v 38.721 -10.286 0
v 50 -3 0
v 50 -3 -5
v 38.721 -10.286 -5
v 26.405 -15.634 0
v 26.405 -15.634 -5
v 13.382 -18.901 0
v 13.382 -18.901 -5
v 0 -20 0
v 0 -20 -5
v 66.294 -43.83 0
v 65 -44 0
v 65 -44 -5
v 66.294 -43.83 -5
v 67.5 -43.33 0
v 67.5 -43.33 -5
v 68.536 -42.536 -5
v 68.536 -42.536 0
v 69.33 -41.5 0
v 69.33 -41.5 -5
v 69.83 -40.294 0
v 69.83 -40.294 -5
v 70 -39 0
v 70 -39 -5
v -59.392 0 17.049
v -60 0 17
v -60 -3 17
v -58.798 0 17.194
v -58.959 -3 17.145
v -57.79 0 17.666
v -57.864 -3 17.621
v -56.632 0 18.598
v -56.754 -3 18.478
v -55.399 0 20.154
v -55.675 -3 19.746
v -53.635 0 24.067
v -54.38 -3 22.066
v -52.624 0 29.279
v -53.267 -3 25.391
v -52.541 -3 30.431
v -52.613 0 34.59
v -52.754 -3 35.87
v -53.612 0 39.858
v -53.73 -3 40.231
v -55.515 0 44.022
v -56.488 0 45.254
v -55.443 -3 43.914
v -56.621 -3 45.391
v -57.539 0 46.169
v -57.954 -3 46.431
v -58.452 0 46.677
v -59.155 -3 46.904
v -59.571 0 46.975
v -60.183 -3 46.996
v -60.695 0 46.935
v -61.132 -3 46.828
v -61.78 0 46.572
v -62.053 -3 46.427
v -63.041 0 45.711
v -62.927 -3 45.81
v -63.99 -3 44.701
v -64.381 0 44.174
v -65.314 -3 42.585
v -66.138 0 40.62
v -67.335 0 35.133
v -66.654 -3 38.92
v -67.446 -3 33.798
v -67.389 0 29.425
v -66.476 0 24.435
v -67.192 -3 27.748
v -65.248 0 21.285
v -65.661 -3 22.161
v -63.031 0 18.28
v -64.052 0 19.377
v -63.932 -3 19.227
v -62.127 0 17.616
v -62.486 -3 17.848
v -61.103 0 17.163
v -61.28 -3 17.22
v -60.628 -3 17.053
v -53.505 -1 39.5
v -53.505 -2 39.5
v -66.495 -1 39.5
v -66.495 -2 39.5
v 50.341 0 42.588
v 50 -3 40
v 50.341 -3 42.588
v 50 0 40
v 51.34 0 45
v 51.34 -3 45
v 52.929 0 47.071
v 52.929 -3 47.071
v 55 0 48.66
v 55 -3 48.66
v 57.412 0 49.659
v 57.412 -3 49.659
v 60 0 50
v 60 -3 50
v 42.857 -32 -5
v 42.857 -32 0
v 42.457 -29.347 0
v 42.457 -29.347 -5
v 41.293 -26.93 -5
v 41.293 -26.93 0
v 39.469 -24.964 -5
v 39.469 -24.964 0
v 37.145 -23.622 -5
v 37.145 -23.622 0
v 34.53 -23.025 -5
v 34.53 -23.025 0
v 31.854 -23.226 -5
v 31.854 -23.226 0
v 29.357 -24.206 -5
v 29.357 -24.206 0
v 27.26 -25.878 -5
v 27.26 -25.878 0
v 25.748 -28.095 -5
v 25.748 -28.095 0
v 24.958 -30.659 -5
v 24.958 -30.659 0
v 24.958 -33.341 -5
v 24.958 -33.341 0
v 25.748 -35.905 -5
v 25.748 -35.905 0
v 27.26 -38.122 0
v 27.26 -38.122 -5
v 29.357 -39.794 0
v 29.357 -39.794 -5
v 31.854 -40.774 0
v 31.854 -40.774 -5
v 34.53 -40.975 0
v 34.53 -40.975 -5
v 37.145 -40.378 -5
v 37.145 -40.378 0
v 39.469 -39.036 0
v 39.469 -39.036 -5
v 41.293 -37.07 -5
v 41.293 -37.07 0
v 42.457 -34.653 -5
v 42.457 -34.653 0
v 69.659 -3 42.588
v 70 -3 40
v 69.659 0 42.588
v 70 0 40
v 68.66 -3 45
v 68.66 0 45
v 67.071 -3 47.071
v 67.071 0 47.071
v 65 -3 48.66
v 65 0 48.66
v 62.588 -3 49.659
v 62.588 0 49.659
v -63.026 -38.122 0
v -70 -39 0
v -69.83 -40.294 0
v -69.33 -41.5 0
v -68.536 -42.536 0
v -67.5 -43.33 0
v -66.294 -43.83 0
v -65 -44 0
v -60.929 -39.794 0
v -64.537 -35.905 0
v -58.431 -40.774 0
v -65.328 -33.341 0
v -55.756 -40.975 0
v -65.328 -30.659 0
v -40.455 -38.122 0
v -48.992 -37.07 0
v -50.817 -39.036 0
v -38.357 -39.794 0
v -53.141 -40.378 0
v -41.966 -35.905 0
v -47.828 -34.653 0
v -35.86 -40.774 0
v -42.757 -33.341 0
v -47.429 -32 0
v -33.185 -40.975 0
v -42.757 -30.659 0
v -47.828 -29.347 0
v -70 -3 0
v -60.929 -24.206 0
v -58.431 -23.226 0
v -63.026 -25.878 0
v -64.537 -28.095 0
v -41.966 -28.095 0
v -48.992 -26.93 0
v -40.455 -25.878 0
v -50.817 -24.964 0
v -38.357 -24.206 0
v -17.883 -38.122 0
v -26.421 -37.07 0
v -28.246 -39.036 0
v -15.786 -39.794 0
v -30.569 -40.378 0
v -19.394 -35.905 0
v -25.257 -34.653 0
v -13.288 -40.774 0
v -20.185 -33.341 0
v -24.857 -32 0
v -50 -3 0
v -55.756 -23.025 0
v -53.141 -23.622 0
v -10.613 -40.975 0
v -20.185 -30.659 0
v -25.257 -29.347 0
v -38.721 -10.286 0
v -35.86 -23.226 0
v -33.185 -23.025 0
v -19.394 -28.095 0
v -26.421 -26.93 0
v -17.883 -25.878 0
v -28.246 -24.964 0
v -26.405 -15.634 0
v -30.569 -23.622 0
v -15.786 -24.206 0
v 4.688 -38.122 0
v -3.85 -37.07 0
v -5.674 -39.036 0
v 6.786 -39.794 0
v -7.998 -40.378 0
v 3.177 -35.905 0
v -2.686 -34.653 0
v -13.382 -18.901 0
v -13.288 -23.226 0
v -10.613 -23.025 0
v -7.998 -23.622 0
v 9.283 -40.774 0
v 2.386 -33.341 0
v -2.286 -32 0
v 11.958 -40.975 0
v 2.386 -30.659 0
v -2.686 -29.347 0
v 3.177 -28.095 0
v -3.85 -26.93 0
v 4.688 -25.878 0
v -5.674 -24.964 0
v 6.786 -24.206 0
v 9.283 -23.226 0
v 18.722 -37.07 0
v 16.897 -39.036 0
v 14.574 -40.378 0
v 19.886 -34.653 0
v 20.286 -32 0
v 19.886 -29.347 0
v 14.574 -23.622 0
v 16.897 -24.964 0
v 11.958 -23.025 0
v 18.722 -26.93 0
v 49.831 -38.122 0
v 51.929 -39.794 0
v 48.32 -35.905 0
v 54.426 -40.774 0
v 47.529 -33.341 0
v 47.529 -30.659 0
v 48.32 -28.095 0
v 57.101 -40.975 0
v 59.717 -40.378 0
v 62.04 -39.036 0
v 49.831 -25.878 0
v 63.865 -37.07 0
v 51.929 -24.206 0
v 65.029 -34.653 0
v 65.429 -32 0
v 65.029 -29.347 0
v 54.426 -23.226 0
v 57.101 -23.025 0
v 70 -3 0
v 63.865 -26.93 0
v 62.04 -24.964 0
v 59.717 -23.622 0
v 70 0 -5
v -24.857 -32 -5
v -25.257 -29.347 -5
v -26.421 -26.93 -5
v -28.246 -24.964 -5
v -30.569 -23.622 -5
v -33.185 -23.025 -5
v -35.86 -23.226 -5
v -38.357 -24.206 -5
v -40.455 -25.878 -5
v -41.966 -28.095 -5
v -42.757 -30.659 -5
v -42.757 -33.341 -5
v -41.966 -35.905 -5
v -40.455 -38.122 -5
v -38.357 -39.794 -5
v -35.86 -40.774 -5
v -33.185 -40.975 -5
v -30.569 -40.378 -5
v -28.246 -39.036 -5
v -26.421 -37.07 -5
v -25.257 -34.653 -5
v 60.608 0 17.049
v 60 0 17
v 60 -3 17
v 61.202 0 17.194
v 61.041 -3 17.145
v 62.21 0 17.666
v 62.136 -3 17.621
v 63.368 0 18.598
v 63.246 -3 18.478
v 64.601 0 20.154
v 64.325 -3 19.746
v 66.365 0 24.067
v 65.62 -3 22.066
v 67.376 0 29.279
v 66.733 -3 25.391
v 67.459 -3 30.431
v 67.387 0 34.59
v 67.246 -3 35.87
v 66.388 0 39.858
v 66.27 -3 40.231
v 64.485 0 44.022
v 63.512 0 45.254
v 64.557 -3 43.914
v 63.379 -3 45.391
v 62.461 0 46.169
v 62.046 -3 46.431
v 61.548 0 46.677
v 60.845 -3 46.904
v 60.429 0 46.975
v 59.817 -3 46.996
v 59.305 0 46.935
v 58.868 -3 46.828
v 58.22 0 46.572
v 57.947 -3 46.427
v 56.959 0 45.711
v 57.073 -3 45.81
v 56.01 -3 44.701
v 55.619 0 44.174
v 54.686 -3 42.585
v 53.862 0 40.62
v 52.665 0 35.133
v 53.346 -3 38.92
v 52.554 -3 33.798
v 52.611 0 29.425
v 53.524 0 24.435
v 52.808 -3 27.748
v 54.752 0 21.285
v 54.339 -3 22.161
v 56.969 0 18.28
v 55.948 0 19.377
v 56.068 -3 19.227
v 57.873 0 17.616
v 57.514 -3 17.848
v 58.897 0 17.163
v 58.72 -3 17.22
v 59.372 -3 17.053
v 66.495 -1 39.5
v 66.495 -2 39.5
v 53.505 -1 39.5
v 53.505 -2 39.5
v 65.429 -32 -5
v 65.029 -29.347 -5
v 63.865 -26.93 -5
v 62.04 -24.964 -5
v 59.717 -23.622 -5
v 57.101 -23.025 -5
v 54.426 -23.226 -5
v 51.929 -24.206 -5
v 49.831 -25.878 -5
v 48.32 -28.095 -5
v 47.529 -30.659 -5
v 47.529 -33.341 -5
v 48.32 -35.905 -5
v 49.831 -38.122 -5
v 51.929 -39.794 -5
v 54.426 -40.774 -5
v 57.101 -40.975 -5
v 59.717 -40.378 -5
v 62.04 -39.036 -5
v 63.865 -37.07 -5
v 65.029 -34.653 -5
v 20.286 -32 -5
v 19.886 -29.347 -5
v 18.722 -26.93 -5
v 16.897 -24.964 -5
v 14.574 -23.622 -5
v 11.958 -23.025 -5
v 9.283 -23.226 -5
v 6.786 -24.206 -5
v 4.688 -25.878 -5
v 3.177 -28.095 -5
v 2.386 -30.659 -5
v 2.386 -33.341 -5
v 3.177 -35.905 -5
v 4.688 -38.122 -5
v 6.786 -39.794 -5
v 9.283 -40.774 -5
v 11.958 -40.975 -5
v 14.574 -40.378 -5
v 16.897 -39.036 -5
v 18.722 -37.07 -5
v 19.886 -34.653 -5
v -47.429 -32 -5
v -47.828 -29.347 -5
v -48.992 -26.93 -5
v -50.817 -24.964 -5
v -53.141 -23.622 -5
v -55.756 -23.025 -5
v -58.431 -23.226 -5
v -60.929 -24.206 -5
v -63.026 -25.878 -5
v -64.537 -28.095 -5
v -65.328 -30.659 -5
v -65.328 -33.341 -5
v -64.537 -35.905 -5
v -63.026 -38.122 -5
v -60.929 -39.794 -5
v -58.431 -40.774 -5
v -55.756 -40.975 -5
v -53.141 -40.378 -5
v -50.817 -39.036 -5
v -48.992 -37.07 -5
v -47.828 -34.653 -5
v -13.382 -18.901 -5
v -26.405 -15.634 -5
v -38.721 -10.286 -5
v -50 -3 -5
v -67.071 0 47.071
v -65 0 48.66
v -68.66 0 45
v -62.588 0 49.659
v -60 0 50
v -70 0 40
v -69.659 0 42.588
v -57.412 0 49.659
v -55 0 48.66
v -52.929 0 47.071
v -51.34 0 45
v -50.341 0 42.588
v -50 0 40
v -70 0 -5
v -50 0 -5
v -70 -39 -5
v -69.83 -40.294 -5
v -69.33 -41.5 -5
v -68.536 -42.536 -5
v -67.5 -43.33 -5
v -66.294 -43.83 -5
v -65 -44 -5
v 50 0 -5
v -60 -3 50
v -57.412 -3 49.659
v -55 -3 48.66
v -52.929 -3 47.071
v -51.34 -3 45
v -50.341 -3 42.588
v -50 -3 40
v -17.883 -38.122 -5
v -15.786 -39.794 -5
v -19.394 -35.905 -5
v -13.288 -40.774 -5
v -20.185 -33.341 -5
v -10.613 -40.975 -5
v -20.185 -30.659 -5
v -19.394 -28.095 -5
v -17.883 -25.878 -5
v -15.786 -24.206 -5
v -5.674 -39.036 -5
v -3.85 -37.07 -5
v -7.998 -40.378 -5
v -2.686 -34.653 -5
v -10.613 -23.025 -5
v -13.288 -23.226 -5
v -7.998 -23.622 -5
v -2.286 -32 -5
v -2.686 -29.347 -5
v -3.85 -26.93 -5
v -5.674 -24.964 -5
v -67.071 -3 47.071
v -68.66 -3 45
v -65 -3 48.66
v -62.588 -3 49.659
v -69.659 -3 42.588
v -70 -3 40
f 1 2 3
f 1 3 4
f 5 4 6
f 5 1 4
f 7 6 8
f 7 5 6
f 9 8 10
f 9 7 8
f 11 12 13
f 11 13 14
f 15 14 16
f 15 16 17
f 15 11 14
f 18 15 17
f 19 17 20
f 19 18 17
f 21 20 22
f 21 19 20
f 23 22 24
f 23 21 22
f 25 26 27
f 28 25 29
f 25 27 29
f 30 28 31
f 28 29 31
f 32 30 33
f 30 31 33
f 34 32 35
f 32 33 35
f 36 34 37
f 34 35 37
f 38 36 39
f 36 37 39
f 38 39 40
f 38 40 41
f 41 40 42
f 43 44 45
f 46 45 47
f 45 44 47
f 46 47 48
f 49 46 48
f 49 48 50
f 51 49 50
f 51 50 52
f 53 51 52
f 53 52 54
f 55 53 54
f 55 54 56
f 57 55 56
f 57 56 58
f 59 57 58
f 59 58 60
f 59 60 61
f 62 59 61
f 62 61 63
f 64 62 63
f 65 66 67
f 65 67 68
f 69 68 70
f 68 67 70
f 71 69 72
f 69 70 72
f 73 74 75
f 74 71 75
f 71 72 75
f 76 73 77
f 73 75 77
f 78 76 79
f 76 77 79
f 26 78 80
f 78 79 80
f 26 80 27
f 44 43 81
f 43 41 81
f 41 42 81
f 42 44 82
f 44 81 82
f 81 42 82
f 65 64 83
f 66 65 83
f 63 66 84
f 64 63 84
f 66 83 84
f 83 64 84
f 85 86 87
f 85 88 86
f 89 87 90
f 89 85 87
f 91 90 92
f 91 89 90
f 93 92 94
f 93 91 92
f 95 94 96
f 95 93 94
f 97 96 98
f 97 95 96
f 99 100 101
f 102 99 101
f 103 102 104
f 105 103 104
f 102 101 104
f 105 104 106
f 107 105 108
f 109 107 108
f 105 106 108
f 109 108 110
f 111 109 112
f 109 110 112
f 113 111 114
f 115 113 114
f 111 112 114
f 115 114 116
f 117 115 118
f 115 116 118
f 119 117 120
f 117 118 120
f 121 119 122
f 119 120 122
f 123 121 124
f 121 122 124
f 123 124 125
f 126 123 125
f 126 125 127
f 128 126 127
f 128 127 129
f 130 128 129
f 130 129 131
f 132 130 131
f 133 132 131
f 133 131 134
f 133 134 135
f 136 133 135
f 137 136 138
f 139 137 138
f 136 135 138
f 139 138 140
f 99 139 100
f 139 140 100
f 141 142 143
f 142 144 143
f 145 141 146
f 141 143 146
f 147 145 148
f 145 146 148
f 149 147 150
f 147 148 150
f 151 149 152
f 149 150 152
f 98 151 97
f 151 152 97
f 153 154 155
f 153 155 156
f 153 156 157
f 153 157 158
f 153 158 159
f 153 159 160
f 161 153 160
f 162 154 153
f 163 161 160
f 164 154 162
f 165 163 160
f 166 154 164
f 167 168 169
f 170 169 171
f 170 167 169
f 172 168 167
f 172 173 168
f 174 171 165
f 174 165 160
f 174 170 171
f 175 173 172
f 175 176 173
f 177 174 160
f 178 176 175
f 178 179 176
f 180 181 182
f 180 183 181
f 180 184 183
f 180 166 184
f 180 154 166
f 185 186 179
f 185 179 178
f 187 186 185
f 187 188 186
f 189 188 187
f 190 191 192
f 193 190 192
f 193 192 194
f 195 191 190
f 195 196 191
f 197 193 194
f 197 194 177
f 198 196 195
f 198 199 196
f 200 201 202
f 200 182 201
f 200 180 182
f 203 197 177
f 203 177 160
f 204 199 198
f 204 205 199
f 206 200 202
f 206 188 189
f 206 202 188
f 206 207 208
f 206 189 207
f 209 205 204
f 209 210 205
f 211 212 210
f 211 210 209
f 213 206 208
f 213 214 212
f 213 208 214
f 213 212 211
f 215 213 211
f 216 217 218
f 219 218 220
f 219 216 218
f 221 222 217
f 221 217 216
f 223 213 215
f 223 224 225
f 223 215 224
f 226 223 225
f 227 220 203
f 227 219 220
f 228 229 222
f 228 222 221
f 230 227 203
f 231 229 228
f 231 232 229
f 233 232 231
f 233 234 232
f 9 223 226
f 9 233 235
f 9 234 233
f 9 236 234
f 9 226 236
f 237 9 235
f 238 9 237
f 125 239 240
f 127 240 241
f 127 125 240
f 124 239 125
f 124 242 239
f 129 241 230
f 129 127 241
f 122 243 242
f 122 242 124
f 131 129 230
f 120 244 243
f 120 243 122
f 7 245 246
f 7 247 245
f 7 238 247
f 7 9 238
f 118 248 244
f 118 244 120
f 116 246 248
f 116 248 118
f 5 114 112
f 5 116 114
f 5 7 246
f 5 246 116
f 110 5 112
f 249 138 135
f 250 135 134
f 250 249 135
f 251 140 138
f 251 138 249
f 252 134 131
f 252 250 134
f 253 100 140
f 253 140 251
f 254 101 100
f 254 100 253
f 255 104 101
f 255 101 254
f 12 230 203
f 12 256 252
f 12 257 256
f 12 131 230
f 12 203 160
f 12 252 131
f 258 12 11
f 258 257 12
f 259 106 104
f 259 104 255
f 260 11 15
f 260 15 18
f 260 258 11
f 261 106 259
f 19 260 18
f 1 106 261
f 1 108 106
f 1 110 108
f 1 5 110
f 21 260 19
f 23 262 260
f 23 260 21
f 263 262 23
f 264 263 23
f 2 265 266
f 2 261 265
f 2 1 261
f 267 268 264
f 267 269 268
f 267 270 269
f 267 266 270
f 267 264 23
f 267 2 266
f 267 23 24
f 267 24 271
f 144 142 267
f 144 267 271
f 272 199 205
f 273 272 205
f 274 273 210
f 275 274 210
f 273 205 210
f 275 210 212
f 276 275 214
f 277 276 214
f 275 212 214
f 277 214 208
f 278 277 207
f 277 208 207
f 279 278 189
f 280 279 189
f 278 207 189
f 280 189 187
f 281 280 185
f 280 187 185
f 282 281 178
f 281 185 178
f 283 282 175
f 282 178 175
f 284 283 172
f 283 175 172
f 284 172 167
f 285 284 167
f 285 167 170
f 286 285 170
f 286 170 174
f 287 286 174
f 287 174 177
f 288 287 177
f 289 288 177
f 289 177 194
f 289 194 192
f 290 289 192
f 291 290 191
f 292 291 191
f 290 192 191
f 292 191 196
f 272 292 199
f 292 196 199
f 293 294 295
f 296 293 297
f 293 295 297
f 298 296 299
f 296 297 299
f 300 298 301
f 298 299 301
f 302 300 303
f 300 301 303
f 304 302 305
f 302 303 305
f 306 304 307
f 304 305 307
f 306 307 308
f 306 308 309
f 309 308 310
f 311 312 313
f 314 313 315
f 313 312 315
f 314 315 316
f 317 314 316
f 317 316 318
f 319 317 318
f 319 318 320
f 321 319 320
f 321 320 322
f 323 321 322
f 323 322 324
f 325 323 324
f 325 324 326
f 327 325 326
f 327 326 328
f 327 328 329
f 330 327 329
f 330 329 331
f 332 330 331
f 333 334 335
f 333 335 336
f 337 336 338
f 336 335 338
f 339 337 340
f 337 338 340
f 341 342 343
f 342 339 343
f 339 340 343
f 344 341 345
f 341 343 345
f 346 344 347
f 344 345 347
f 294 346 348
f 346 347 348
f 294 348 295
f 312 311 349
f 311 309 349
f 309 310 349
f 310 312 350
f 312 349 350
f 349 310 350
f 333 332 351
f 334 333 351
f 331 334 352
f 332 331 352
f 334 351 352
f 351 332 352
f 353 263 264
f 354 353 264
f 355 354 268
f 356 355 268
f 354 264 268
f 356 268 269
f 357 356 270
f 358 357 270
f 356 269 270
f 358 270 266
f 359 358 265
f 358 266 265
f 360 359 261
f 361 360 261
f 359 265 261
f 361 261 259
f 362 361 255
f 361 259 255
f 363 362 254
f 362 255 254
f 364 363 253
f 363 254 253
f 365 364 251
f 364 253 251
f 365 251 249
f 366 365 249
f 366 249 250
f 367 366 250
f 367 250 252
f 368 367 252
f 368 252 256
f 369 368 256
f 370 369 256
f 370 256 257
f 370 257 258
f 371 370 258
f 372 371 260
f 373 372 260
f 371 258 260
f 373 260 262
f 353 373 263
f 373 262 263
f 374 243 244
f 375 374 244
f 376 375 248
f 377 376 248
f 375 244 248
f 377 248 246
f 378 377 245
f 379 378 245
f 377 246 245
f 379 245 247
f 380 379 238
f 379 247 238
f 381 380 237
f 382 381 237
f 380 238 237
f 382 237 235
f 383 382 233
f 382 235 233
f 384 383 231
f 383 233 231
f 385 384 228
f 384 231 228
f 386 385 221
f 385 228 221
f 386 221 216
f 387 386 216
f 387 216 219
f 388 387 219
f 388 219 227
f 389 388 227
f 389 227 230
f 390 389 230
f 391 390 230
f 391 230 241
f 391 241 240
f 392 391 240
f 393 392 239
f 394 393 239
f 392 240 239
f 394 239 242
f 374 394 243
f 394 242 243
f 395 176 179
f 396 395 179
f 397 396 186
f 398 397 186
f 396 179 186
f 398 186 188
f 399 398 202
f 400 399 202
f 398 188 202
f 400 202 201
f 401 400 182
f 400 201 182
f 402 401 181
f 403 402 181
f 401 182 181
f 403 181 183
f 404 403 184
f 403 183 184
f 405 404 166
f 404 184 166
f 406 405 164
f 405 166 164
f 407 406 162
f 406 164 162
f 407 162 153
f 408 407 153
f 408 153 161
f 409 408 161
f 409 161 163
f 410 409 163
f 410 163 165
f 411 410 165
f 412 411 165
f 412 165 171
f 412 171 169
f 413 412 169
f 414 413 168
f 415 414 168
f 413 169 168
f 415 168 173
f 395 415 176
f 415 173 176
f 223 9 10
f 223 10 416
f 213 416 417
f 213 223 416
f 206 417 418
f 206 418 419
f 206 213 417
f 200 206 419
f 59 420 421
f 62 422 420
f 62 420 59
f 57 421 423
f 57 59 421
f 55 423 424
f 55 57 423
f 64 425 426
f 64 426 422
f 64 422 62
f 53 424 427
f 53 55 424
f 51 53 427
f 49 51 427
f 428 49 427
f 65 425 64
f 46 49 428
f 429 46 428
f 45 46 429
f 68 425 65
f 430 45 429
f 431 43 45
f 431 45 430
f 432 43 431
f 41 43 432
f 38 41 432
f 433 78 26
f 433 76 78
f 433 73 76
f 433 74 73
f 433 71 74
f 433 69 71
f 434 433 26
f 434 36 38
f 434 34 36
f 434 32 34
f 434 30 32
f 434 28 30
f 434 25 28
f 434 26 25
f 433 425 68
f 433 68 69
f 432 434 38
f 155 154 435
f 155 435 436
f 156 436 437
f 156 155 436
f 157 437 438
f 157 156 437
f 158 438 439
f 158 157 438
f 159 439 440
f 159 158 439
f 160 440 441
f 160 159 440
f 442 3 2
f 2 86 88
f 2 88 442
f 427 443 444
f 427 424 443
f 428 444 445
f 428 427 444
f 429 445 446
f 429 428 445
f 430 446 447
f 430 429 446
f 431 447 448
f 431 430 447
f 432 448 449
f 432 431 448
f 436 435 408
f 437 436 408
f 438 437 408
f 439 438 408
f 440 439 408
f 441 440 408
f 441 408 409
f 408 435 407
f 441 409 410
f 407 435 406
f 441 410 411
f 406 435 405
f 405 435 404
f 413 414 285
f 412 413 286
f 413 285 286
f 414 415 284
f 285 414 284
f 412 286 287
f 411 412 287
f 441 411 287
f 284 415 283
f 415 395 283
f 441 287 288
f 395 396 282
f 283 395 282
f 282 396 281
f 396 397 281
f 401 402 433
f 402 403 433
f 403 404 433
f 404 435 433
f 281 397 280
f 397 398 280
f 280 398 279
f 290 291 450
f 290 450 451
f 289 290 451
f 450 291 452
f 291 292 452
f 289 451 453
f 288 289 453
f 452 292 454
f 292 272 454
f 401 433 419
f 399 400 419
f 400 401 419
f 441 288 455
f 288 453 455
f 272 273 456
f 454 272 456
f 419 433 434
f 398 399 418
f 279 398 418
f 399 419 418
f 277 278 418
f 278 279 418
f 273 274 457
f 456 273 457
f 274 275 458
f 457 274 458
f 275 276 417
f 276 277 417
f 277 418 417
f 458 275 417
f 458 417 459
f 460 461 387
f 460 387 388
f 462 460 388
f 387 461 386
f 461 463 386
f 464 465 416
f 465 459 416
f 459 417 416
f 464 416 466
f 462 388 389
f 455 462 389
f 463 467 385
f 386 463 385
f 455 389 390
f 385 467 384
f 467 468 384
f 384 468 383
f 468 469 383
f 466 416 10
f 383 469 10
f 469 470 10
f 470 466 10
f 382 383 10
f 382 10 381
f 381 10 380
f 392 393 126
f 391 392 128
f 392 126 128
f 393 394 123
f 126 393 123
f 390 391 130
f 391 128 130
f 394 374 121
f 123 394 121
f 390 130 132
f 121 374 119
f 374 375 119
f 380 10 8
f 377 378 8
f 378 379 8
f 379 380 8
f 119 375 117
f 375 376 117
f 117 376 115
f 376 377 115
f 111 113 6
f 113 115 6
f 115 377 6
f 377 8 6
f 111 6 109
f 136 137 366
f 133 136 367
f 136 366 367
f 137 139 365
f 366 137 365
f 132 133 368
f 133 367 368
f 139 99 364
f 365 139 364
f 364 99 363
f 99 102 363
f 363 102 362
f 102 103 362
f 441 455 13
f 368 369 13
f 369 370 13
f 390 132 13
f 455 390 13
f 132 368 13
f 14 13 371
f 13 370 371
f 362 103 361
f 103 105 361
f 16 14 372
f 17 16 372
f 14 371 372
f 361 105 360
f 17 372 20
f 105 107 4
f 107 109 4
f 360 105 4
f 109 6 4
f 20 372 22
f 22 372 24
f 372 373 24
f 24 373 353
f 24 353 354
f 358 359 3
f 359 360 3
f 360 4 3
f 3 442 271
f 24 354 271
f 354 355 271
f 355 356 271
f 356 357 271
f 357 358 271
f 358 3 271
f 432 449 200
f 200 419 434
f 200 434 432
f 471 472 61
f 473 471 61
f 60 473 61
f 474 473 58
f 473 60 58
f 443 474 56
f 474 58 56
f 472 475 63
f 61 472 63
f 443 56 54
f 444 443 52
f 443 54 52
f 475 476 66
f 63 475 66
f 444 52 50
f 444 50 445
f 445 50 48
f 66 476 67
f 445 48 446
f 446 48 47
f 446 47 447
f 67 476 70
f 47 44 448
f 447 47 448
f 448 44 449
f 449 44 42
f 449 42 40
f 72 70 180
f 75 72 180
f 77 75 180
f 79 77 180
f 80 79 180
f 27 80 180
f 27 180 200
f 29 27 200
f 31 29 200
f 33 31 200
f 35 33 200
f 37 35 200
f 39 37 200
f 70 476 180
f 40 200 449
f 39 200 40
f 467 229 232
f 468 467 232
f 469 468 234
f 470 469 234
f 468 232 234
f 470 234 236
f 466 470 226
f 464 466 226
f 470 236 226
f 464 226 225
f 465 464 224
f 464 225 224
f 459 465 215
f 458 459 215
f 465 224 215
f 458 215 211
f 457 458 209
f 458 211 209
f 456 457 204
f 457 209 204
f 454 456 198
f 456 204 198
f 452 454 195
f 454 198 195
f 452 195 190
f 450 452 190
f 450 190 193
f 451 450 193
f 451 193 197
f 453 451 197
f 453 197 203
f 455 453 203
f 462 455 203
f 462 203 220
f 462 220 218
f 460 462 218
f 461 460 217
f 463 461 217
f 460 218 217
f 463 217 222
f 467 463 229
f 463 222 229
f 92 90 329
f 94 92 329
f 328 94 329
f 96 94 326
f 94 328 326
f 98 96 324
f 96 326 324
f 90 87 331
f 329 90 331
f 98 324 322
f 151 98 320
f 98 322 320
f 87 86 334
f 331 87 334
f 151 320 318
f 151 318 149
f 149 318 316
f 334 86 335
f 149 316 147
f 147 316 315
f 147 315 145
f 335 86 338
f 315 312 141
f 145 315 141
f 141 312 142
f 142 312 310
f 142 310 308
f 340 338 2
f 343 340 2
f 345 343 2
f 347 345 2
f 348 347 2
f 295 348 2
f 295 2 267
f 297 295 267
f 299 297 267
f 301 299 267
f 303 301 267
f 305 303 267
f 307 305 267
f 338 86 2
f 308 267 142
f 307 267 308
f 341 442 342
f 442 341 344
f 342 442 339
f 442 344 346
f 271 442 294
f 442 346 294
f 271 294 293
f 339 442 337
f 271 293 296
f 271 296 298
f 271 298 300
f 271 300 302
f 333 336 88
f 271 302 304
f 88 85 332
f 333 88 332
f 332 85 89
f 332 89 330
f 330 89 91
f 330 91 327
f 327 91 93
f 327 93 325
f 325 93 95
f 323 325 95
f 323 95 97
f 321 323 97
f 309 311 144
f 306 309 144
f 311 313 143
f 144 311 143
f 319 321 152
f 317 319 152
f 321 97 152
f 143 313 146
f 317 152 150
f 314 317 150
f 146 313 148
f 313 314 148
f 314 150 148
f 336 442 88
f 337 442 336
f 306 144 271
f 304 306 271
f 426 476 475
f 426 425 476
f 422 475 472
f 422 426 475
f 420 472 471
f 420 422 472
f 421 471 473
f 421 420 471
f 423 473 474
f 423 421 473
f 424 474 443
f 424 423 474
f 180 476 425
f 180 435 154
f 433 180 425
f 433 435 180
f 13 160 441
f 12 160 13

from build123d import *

# Parameters (mm, degrees)
F0_R     = 9
F0_W     = 20
F0_H     = 3
F1_DEPTH = 5
F2_DEPTH = 50
F4_DEPTH = 12.5
F5_R     = 9.99999


# Not quite as in the source:
# - a fillet or chamfer is up to 0.001 mm smaller than in the source, because OpenCascade refuses the exact size


with BuildPart() as f1:
    # F0 (on Top) → F1 (new body)
    with BuildSketch(Plane.XY):
        with BuildLine():
            Line((-70, -3), (-70, -20))
            Line((-70, -20), (2.765e-07, -20))
            ThreePointArc((2.765e-07, -20), (-26.4054917221, -15.6337996122), (-50, -3))
            Line((-50, -3), (-70, -3))
        make_face()
        with BuildLine():
            Line((2.765e-07, -20), (-70, -20))
            Line((-70, -20), (-70, -39))
            ThreePointArc((-70, -39), (-68.5355339059, -42.5355339059), (-65, -44))
            Line((-65, -44), (65, -44))
            ThreePointArc((65, -44), (68.5355339059, -42.5355339059), (70, -39))
            Line((70, -39), (70, -20))
            Line((70, -20), (2.765e-07, -20))
        make_face()
        with Locations((-56.4285714286, -32)):
            Circle(F0_R, mode=Mode.SUBTRACT)
        with Locations((-33.8571428571, -32)):
            Circle(F0_R, mode=Mode.SUBTRACT)
        with Locations((-11.2857142857, -32)):
            Circle(F0_R, mode=Mode.SUBTRACT)
        with Locations((11.2857142857, -32)):
            Circle(F0_R, mode=Mode.SUBTRACT)
        with Locations((33.8571428571, -32)):
            Circle(F0_R, mode=Mode.SUBTRACT)
        with Locations((56.4285714286, -32)):
            Circle(F0_R, mode=Mode.SUBTRACT)
        with BuildLine():
            ThreePointArc((50, -3), (26.4054919839, -15.6337995232), (2.765e-07, -20))
            Line((2.765e-07, -20), (70, -20))
            Line((70, -20), (70, -3))
            Line((70, -3), (50, -3))
        make_face()
        with Locations((-60, -1.5)):
            Rectangle(F0_W, F0_H)
        with Locations((60, -1.5)):
            Rectangle(F0_W, F0_H)
    extrude(amount=-F1_DEPTH)

    # F0 (on Top) → F2 (join)
    with BuildSketch(Plane.XY):
        with Locations((-60, -1.5)):
            Rectangle(F0_W, F0_H)
        with Locations((60, -1.5)):
            Rectangle(F0_W, F0_H)
    extrude(amount=F2_DEPTH)

    # F3 (on face) → F4 (cut, symmetric)
    with BuildSketch(Plane.XZ.offset(3)):
        with BuildLine():
            add(Edge.make_bspline(
                [(-60, 17), (-47.0096189432, 17), (-53.5048094716, 39.5), (-60, 62), (-66.4951905284, 39.5), (-72.9903810568, 17), (-60, 17)],
                knots=[0, 0, 0, 2.0943951024, 2.0943951024, 4.1887902048, 4.1887902048, 6.2831853072, 6.2831853072, 6.2831853072], degree=2, weights=[1, 0.5, 1, 0.5, 1, 0.5, 1]))
        make_face()
        with BuildLine():
            add(Edge.make_bspline(
                [(60, 17), (72.9903810568, 17), (66.4951905284, 39.5), (60, 62), (53.5048094716, 39.5), (47.0096189432, 17), (60, 17)],
                knots=[0, 0, 0, 2.0943951024, 2.0943951024, 4.1887902048, 4.1887902048, 6.2831853072, 6.2831853072, 6.2831853072], degree=2, weights=[1, 0.5, 1, 0.5, 1, 0.5, 1]))
        make_face()
    extrude(amount=F4_DEPTH, both=True, mode=Mode.SUBTRACT)

    # F5 (radius 10 in the source; OpenCascade refuses exactly that, so slightly less here)
    f5_edges = [f1.edges().sort_by_distance(p)[0] for p in [
        (-70, -1.5, 50),
        (-50, -1.5, 50),
        (70, -1.5, 50),
        (50, -1.5, 50),
    ]]
    fillet(f5_edges, radius=F5_R)


solid = f1.part
